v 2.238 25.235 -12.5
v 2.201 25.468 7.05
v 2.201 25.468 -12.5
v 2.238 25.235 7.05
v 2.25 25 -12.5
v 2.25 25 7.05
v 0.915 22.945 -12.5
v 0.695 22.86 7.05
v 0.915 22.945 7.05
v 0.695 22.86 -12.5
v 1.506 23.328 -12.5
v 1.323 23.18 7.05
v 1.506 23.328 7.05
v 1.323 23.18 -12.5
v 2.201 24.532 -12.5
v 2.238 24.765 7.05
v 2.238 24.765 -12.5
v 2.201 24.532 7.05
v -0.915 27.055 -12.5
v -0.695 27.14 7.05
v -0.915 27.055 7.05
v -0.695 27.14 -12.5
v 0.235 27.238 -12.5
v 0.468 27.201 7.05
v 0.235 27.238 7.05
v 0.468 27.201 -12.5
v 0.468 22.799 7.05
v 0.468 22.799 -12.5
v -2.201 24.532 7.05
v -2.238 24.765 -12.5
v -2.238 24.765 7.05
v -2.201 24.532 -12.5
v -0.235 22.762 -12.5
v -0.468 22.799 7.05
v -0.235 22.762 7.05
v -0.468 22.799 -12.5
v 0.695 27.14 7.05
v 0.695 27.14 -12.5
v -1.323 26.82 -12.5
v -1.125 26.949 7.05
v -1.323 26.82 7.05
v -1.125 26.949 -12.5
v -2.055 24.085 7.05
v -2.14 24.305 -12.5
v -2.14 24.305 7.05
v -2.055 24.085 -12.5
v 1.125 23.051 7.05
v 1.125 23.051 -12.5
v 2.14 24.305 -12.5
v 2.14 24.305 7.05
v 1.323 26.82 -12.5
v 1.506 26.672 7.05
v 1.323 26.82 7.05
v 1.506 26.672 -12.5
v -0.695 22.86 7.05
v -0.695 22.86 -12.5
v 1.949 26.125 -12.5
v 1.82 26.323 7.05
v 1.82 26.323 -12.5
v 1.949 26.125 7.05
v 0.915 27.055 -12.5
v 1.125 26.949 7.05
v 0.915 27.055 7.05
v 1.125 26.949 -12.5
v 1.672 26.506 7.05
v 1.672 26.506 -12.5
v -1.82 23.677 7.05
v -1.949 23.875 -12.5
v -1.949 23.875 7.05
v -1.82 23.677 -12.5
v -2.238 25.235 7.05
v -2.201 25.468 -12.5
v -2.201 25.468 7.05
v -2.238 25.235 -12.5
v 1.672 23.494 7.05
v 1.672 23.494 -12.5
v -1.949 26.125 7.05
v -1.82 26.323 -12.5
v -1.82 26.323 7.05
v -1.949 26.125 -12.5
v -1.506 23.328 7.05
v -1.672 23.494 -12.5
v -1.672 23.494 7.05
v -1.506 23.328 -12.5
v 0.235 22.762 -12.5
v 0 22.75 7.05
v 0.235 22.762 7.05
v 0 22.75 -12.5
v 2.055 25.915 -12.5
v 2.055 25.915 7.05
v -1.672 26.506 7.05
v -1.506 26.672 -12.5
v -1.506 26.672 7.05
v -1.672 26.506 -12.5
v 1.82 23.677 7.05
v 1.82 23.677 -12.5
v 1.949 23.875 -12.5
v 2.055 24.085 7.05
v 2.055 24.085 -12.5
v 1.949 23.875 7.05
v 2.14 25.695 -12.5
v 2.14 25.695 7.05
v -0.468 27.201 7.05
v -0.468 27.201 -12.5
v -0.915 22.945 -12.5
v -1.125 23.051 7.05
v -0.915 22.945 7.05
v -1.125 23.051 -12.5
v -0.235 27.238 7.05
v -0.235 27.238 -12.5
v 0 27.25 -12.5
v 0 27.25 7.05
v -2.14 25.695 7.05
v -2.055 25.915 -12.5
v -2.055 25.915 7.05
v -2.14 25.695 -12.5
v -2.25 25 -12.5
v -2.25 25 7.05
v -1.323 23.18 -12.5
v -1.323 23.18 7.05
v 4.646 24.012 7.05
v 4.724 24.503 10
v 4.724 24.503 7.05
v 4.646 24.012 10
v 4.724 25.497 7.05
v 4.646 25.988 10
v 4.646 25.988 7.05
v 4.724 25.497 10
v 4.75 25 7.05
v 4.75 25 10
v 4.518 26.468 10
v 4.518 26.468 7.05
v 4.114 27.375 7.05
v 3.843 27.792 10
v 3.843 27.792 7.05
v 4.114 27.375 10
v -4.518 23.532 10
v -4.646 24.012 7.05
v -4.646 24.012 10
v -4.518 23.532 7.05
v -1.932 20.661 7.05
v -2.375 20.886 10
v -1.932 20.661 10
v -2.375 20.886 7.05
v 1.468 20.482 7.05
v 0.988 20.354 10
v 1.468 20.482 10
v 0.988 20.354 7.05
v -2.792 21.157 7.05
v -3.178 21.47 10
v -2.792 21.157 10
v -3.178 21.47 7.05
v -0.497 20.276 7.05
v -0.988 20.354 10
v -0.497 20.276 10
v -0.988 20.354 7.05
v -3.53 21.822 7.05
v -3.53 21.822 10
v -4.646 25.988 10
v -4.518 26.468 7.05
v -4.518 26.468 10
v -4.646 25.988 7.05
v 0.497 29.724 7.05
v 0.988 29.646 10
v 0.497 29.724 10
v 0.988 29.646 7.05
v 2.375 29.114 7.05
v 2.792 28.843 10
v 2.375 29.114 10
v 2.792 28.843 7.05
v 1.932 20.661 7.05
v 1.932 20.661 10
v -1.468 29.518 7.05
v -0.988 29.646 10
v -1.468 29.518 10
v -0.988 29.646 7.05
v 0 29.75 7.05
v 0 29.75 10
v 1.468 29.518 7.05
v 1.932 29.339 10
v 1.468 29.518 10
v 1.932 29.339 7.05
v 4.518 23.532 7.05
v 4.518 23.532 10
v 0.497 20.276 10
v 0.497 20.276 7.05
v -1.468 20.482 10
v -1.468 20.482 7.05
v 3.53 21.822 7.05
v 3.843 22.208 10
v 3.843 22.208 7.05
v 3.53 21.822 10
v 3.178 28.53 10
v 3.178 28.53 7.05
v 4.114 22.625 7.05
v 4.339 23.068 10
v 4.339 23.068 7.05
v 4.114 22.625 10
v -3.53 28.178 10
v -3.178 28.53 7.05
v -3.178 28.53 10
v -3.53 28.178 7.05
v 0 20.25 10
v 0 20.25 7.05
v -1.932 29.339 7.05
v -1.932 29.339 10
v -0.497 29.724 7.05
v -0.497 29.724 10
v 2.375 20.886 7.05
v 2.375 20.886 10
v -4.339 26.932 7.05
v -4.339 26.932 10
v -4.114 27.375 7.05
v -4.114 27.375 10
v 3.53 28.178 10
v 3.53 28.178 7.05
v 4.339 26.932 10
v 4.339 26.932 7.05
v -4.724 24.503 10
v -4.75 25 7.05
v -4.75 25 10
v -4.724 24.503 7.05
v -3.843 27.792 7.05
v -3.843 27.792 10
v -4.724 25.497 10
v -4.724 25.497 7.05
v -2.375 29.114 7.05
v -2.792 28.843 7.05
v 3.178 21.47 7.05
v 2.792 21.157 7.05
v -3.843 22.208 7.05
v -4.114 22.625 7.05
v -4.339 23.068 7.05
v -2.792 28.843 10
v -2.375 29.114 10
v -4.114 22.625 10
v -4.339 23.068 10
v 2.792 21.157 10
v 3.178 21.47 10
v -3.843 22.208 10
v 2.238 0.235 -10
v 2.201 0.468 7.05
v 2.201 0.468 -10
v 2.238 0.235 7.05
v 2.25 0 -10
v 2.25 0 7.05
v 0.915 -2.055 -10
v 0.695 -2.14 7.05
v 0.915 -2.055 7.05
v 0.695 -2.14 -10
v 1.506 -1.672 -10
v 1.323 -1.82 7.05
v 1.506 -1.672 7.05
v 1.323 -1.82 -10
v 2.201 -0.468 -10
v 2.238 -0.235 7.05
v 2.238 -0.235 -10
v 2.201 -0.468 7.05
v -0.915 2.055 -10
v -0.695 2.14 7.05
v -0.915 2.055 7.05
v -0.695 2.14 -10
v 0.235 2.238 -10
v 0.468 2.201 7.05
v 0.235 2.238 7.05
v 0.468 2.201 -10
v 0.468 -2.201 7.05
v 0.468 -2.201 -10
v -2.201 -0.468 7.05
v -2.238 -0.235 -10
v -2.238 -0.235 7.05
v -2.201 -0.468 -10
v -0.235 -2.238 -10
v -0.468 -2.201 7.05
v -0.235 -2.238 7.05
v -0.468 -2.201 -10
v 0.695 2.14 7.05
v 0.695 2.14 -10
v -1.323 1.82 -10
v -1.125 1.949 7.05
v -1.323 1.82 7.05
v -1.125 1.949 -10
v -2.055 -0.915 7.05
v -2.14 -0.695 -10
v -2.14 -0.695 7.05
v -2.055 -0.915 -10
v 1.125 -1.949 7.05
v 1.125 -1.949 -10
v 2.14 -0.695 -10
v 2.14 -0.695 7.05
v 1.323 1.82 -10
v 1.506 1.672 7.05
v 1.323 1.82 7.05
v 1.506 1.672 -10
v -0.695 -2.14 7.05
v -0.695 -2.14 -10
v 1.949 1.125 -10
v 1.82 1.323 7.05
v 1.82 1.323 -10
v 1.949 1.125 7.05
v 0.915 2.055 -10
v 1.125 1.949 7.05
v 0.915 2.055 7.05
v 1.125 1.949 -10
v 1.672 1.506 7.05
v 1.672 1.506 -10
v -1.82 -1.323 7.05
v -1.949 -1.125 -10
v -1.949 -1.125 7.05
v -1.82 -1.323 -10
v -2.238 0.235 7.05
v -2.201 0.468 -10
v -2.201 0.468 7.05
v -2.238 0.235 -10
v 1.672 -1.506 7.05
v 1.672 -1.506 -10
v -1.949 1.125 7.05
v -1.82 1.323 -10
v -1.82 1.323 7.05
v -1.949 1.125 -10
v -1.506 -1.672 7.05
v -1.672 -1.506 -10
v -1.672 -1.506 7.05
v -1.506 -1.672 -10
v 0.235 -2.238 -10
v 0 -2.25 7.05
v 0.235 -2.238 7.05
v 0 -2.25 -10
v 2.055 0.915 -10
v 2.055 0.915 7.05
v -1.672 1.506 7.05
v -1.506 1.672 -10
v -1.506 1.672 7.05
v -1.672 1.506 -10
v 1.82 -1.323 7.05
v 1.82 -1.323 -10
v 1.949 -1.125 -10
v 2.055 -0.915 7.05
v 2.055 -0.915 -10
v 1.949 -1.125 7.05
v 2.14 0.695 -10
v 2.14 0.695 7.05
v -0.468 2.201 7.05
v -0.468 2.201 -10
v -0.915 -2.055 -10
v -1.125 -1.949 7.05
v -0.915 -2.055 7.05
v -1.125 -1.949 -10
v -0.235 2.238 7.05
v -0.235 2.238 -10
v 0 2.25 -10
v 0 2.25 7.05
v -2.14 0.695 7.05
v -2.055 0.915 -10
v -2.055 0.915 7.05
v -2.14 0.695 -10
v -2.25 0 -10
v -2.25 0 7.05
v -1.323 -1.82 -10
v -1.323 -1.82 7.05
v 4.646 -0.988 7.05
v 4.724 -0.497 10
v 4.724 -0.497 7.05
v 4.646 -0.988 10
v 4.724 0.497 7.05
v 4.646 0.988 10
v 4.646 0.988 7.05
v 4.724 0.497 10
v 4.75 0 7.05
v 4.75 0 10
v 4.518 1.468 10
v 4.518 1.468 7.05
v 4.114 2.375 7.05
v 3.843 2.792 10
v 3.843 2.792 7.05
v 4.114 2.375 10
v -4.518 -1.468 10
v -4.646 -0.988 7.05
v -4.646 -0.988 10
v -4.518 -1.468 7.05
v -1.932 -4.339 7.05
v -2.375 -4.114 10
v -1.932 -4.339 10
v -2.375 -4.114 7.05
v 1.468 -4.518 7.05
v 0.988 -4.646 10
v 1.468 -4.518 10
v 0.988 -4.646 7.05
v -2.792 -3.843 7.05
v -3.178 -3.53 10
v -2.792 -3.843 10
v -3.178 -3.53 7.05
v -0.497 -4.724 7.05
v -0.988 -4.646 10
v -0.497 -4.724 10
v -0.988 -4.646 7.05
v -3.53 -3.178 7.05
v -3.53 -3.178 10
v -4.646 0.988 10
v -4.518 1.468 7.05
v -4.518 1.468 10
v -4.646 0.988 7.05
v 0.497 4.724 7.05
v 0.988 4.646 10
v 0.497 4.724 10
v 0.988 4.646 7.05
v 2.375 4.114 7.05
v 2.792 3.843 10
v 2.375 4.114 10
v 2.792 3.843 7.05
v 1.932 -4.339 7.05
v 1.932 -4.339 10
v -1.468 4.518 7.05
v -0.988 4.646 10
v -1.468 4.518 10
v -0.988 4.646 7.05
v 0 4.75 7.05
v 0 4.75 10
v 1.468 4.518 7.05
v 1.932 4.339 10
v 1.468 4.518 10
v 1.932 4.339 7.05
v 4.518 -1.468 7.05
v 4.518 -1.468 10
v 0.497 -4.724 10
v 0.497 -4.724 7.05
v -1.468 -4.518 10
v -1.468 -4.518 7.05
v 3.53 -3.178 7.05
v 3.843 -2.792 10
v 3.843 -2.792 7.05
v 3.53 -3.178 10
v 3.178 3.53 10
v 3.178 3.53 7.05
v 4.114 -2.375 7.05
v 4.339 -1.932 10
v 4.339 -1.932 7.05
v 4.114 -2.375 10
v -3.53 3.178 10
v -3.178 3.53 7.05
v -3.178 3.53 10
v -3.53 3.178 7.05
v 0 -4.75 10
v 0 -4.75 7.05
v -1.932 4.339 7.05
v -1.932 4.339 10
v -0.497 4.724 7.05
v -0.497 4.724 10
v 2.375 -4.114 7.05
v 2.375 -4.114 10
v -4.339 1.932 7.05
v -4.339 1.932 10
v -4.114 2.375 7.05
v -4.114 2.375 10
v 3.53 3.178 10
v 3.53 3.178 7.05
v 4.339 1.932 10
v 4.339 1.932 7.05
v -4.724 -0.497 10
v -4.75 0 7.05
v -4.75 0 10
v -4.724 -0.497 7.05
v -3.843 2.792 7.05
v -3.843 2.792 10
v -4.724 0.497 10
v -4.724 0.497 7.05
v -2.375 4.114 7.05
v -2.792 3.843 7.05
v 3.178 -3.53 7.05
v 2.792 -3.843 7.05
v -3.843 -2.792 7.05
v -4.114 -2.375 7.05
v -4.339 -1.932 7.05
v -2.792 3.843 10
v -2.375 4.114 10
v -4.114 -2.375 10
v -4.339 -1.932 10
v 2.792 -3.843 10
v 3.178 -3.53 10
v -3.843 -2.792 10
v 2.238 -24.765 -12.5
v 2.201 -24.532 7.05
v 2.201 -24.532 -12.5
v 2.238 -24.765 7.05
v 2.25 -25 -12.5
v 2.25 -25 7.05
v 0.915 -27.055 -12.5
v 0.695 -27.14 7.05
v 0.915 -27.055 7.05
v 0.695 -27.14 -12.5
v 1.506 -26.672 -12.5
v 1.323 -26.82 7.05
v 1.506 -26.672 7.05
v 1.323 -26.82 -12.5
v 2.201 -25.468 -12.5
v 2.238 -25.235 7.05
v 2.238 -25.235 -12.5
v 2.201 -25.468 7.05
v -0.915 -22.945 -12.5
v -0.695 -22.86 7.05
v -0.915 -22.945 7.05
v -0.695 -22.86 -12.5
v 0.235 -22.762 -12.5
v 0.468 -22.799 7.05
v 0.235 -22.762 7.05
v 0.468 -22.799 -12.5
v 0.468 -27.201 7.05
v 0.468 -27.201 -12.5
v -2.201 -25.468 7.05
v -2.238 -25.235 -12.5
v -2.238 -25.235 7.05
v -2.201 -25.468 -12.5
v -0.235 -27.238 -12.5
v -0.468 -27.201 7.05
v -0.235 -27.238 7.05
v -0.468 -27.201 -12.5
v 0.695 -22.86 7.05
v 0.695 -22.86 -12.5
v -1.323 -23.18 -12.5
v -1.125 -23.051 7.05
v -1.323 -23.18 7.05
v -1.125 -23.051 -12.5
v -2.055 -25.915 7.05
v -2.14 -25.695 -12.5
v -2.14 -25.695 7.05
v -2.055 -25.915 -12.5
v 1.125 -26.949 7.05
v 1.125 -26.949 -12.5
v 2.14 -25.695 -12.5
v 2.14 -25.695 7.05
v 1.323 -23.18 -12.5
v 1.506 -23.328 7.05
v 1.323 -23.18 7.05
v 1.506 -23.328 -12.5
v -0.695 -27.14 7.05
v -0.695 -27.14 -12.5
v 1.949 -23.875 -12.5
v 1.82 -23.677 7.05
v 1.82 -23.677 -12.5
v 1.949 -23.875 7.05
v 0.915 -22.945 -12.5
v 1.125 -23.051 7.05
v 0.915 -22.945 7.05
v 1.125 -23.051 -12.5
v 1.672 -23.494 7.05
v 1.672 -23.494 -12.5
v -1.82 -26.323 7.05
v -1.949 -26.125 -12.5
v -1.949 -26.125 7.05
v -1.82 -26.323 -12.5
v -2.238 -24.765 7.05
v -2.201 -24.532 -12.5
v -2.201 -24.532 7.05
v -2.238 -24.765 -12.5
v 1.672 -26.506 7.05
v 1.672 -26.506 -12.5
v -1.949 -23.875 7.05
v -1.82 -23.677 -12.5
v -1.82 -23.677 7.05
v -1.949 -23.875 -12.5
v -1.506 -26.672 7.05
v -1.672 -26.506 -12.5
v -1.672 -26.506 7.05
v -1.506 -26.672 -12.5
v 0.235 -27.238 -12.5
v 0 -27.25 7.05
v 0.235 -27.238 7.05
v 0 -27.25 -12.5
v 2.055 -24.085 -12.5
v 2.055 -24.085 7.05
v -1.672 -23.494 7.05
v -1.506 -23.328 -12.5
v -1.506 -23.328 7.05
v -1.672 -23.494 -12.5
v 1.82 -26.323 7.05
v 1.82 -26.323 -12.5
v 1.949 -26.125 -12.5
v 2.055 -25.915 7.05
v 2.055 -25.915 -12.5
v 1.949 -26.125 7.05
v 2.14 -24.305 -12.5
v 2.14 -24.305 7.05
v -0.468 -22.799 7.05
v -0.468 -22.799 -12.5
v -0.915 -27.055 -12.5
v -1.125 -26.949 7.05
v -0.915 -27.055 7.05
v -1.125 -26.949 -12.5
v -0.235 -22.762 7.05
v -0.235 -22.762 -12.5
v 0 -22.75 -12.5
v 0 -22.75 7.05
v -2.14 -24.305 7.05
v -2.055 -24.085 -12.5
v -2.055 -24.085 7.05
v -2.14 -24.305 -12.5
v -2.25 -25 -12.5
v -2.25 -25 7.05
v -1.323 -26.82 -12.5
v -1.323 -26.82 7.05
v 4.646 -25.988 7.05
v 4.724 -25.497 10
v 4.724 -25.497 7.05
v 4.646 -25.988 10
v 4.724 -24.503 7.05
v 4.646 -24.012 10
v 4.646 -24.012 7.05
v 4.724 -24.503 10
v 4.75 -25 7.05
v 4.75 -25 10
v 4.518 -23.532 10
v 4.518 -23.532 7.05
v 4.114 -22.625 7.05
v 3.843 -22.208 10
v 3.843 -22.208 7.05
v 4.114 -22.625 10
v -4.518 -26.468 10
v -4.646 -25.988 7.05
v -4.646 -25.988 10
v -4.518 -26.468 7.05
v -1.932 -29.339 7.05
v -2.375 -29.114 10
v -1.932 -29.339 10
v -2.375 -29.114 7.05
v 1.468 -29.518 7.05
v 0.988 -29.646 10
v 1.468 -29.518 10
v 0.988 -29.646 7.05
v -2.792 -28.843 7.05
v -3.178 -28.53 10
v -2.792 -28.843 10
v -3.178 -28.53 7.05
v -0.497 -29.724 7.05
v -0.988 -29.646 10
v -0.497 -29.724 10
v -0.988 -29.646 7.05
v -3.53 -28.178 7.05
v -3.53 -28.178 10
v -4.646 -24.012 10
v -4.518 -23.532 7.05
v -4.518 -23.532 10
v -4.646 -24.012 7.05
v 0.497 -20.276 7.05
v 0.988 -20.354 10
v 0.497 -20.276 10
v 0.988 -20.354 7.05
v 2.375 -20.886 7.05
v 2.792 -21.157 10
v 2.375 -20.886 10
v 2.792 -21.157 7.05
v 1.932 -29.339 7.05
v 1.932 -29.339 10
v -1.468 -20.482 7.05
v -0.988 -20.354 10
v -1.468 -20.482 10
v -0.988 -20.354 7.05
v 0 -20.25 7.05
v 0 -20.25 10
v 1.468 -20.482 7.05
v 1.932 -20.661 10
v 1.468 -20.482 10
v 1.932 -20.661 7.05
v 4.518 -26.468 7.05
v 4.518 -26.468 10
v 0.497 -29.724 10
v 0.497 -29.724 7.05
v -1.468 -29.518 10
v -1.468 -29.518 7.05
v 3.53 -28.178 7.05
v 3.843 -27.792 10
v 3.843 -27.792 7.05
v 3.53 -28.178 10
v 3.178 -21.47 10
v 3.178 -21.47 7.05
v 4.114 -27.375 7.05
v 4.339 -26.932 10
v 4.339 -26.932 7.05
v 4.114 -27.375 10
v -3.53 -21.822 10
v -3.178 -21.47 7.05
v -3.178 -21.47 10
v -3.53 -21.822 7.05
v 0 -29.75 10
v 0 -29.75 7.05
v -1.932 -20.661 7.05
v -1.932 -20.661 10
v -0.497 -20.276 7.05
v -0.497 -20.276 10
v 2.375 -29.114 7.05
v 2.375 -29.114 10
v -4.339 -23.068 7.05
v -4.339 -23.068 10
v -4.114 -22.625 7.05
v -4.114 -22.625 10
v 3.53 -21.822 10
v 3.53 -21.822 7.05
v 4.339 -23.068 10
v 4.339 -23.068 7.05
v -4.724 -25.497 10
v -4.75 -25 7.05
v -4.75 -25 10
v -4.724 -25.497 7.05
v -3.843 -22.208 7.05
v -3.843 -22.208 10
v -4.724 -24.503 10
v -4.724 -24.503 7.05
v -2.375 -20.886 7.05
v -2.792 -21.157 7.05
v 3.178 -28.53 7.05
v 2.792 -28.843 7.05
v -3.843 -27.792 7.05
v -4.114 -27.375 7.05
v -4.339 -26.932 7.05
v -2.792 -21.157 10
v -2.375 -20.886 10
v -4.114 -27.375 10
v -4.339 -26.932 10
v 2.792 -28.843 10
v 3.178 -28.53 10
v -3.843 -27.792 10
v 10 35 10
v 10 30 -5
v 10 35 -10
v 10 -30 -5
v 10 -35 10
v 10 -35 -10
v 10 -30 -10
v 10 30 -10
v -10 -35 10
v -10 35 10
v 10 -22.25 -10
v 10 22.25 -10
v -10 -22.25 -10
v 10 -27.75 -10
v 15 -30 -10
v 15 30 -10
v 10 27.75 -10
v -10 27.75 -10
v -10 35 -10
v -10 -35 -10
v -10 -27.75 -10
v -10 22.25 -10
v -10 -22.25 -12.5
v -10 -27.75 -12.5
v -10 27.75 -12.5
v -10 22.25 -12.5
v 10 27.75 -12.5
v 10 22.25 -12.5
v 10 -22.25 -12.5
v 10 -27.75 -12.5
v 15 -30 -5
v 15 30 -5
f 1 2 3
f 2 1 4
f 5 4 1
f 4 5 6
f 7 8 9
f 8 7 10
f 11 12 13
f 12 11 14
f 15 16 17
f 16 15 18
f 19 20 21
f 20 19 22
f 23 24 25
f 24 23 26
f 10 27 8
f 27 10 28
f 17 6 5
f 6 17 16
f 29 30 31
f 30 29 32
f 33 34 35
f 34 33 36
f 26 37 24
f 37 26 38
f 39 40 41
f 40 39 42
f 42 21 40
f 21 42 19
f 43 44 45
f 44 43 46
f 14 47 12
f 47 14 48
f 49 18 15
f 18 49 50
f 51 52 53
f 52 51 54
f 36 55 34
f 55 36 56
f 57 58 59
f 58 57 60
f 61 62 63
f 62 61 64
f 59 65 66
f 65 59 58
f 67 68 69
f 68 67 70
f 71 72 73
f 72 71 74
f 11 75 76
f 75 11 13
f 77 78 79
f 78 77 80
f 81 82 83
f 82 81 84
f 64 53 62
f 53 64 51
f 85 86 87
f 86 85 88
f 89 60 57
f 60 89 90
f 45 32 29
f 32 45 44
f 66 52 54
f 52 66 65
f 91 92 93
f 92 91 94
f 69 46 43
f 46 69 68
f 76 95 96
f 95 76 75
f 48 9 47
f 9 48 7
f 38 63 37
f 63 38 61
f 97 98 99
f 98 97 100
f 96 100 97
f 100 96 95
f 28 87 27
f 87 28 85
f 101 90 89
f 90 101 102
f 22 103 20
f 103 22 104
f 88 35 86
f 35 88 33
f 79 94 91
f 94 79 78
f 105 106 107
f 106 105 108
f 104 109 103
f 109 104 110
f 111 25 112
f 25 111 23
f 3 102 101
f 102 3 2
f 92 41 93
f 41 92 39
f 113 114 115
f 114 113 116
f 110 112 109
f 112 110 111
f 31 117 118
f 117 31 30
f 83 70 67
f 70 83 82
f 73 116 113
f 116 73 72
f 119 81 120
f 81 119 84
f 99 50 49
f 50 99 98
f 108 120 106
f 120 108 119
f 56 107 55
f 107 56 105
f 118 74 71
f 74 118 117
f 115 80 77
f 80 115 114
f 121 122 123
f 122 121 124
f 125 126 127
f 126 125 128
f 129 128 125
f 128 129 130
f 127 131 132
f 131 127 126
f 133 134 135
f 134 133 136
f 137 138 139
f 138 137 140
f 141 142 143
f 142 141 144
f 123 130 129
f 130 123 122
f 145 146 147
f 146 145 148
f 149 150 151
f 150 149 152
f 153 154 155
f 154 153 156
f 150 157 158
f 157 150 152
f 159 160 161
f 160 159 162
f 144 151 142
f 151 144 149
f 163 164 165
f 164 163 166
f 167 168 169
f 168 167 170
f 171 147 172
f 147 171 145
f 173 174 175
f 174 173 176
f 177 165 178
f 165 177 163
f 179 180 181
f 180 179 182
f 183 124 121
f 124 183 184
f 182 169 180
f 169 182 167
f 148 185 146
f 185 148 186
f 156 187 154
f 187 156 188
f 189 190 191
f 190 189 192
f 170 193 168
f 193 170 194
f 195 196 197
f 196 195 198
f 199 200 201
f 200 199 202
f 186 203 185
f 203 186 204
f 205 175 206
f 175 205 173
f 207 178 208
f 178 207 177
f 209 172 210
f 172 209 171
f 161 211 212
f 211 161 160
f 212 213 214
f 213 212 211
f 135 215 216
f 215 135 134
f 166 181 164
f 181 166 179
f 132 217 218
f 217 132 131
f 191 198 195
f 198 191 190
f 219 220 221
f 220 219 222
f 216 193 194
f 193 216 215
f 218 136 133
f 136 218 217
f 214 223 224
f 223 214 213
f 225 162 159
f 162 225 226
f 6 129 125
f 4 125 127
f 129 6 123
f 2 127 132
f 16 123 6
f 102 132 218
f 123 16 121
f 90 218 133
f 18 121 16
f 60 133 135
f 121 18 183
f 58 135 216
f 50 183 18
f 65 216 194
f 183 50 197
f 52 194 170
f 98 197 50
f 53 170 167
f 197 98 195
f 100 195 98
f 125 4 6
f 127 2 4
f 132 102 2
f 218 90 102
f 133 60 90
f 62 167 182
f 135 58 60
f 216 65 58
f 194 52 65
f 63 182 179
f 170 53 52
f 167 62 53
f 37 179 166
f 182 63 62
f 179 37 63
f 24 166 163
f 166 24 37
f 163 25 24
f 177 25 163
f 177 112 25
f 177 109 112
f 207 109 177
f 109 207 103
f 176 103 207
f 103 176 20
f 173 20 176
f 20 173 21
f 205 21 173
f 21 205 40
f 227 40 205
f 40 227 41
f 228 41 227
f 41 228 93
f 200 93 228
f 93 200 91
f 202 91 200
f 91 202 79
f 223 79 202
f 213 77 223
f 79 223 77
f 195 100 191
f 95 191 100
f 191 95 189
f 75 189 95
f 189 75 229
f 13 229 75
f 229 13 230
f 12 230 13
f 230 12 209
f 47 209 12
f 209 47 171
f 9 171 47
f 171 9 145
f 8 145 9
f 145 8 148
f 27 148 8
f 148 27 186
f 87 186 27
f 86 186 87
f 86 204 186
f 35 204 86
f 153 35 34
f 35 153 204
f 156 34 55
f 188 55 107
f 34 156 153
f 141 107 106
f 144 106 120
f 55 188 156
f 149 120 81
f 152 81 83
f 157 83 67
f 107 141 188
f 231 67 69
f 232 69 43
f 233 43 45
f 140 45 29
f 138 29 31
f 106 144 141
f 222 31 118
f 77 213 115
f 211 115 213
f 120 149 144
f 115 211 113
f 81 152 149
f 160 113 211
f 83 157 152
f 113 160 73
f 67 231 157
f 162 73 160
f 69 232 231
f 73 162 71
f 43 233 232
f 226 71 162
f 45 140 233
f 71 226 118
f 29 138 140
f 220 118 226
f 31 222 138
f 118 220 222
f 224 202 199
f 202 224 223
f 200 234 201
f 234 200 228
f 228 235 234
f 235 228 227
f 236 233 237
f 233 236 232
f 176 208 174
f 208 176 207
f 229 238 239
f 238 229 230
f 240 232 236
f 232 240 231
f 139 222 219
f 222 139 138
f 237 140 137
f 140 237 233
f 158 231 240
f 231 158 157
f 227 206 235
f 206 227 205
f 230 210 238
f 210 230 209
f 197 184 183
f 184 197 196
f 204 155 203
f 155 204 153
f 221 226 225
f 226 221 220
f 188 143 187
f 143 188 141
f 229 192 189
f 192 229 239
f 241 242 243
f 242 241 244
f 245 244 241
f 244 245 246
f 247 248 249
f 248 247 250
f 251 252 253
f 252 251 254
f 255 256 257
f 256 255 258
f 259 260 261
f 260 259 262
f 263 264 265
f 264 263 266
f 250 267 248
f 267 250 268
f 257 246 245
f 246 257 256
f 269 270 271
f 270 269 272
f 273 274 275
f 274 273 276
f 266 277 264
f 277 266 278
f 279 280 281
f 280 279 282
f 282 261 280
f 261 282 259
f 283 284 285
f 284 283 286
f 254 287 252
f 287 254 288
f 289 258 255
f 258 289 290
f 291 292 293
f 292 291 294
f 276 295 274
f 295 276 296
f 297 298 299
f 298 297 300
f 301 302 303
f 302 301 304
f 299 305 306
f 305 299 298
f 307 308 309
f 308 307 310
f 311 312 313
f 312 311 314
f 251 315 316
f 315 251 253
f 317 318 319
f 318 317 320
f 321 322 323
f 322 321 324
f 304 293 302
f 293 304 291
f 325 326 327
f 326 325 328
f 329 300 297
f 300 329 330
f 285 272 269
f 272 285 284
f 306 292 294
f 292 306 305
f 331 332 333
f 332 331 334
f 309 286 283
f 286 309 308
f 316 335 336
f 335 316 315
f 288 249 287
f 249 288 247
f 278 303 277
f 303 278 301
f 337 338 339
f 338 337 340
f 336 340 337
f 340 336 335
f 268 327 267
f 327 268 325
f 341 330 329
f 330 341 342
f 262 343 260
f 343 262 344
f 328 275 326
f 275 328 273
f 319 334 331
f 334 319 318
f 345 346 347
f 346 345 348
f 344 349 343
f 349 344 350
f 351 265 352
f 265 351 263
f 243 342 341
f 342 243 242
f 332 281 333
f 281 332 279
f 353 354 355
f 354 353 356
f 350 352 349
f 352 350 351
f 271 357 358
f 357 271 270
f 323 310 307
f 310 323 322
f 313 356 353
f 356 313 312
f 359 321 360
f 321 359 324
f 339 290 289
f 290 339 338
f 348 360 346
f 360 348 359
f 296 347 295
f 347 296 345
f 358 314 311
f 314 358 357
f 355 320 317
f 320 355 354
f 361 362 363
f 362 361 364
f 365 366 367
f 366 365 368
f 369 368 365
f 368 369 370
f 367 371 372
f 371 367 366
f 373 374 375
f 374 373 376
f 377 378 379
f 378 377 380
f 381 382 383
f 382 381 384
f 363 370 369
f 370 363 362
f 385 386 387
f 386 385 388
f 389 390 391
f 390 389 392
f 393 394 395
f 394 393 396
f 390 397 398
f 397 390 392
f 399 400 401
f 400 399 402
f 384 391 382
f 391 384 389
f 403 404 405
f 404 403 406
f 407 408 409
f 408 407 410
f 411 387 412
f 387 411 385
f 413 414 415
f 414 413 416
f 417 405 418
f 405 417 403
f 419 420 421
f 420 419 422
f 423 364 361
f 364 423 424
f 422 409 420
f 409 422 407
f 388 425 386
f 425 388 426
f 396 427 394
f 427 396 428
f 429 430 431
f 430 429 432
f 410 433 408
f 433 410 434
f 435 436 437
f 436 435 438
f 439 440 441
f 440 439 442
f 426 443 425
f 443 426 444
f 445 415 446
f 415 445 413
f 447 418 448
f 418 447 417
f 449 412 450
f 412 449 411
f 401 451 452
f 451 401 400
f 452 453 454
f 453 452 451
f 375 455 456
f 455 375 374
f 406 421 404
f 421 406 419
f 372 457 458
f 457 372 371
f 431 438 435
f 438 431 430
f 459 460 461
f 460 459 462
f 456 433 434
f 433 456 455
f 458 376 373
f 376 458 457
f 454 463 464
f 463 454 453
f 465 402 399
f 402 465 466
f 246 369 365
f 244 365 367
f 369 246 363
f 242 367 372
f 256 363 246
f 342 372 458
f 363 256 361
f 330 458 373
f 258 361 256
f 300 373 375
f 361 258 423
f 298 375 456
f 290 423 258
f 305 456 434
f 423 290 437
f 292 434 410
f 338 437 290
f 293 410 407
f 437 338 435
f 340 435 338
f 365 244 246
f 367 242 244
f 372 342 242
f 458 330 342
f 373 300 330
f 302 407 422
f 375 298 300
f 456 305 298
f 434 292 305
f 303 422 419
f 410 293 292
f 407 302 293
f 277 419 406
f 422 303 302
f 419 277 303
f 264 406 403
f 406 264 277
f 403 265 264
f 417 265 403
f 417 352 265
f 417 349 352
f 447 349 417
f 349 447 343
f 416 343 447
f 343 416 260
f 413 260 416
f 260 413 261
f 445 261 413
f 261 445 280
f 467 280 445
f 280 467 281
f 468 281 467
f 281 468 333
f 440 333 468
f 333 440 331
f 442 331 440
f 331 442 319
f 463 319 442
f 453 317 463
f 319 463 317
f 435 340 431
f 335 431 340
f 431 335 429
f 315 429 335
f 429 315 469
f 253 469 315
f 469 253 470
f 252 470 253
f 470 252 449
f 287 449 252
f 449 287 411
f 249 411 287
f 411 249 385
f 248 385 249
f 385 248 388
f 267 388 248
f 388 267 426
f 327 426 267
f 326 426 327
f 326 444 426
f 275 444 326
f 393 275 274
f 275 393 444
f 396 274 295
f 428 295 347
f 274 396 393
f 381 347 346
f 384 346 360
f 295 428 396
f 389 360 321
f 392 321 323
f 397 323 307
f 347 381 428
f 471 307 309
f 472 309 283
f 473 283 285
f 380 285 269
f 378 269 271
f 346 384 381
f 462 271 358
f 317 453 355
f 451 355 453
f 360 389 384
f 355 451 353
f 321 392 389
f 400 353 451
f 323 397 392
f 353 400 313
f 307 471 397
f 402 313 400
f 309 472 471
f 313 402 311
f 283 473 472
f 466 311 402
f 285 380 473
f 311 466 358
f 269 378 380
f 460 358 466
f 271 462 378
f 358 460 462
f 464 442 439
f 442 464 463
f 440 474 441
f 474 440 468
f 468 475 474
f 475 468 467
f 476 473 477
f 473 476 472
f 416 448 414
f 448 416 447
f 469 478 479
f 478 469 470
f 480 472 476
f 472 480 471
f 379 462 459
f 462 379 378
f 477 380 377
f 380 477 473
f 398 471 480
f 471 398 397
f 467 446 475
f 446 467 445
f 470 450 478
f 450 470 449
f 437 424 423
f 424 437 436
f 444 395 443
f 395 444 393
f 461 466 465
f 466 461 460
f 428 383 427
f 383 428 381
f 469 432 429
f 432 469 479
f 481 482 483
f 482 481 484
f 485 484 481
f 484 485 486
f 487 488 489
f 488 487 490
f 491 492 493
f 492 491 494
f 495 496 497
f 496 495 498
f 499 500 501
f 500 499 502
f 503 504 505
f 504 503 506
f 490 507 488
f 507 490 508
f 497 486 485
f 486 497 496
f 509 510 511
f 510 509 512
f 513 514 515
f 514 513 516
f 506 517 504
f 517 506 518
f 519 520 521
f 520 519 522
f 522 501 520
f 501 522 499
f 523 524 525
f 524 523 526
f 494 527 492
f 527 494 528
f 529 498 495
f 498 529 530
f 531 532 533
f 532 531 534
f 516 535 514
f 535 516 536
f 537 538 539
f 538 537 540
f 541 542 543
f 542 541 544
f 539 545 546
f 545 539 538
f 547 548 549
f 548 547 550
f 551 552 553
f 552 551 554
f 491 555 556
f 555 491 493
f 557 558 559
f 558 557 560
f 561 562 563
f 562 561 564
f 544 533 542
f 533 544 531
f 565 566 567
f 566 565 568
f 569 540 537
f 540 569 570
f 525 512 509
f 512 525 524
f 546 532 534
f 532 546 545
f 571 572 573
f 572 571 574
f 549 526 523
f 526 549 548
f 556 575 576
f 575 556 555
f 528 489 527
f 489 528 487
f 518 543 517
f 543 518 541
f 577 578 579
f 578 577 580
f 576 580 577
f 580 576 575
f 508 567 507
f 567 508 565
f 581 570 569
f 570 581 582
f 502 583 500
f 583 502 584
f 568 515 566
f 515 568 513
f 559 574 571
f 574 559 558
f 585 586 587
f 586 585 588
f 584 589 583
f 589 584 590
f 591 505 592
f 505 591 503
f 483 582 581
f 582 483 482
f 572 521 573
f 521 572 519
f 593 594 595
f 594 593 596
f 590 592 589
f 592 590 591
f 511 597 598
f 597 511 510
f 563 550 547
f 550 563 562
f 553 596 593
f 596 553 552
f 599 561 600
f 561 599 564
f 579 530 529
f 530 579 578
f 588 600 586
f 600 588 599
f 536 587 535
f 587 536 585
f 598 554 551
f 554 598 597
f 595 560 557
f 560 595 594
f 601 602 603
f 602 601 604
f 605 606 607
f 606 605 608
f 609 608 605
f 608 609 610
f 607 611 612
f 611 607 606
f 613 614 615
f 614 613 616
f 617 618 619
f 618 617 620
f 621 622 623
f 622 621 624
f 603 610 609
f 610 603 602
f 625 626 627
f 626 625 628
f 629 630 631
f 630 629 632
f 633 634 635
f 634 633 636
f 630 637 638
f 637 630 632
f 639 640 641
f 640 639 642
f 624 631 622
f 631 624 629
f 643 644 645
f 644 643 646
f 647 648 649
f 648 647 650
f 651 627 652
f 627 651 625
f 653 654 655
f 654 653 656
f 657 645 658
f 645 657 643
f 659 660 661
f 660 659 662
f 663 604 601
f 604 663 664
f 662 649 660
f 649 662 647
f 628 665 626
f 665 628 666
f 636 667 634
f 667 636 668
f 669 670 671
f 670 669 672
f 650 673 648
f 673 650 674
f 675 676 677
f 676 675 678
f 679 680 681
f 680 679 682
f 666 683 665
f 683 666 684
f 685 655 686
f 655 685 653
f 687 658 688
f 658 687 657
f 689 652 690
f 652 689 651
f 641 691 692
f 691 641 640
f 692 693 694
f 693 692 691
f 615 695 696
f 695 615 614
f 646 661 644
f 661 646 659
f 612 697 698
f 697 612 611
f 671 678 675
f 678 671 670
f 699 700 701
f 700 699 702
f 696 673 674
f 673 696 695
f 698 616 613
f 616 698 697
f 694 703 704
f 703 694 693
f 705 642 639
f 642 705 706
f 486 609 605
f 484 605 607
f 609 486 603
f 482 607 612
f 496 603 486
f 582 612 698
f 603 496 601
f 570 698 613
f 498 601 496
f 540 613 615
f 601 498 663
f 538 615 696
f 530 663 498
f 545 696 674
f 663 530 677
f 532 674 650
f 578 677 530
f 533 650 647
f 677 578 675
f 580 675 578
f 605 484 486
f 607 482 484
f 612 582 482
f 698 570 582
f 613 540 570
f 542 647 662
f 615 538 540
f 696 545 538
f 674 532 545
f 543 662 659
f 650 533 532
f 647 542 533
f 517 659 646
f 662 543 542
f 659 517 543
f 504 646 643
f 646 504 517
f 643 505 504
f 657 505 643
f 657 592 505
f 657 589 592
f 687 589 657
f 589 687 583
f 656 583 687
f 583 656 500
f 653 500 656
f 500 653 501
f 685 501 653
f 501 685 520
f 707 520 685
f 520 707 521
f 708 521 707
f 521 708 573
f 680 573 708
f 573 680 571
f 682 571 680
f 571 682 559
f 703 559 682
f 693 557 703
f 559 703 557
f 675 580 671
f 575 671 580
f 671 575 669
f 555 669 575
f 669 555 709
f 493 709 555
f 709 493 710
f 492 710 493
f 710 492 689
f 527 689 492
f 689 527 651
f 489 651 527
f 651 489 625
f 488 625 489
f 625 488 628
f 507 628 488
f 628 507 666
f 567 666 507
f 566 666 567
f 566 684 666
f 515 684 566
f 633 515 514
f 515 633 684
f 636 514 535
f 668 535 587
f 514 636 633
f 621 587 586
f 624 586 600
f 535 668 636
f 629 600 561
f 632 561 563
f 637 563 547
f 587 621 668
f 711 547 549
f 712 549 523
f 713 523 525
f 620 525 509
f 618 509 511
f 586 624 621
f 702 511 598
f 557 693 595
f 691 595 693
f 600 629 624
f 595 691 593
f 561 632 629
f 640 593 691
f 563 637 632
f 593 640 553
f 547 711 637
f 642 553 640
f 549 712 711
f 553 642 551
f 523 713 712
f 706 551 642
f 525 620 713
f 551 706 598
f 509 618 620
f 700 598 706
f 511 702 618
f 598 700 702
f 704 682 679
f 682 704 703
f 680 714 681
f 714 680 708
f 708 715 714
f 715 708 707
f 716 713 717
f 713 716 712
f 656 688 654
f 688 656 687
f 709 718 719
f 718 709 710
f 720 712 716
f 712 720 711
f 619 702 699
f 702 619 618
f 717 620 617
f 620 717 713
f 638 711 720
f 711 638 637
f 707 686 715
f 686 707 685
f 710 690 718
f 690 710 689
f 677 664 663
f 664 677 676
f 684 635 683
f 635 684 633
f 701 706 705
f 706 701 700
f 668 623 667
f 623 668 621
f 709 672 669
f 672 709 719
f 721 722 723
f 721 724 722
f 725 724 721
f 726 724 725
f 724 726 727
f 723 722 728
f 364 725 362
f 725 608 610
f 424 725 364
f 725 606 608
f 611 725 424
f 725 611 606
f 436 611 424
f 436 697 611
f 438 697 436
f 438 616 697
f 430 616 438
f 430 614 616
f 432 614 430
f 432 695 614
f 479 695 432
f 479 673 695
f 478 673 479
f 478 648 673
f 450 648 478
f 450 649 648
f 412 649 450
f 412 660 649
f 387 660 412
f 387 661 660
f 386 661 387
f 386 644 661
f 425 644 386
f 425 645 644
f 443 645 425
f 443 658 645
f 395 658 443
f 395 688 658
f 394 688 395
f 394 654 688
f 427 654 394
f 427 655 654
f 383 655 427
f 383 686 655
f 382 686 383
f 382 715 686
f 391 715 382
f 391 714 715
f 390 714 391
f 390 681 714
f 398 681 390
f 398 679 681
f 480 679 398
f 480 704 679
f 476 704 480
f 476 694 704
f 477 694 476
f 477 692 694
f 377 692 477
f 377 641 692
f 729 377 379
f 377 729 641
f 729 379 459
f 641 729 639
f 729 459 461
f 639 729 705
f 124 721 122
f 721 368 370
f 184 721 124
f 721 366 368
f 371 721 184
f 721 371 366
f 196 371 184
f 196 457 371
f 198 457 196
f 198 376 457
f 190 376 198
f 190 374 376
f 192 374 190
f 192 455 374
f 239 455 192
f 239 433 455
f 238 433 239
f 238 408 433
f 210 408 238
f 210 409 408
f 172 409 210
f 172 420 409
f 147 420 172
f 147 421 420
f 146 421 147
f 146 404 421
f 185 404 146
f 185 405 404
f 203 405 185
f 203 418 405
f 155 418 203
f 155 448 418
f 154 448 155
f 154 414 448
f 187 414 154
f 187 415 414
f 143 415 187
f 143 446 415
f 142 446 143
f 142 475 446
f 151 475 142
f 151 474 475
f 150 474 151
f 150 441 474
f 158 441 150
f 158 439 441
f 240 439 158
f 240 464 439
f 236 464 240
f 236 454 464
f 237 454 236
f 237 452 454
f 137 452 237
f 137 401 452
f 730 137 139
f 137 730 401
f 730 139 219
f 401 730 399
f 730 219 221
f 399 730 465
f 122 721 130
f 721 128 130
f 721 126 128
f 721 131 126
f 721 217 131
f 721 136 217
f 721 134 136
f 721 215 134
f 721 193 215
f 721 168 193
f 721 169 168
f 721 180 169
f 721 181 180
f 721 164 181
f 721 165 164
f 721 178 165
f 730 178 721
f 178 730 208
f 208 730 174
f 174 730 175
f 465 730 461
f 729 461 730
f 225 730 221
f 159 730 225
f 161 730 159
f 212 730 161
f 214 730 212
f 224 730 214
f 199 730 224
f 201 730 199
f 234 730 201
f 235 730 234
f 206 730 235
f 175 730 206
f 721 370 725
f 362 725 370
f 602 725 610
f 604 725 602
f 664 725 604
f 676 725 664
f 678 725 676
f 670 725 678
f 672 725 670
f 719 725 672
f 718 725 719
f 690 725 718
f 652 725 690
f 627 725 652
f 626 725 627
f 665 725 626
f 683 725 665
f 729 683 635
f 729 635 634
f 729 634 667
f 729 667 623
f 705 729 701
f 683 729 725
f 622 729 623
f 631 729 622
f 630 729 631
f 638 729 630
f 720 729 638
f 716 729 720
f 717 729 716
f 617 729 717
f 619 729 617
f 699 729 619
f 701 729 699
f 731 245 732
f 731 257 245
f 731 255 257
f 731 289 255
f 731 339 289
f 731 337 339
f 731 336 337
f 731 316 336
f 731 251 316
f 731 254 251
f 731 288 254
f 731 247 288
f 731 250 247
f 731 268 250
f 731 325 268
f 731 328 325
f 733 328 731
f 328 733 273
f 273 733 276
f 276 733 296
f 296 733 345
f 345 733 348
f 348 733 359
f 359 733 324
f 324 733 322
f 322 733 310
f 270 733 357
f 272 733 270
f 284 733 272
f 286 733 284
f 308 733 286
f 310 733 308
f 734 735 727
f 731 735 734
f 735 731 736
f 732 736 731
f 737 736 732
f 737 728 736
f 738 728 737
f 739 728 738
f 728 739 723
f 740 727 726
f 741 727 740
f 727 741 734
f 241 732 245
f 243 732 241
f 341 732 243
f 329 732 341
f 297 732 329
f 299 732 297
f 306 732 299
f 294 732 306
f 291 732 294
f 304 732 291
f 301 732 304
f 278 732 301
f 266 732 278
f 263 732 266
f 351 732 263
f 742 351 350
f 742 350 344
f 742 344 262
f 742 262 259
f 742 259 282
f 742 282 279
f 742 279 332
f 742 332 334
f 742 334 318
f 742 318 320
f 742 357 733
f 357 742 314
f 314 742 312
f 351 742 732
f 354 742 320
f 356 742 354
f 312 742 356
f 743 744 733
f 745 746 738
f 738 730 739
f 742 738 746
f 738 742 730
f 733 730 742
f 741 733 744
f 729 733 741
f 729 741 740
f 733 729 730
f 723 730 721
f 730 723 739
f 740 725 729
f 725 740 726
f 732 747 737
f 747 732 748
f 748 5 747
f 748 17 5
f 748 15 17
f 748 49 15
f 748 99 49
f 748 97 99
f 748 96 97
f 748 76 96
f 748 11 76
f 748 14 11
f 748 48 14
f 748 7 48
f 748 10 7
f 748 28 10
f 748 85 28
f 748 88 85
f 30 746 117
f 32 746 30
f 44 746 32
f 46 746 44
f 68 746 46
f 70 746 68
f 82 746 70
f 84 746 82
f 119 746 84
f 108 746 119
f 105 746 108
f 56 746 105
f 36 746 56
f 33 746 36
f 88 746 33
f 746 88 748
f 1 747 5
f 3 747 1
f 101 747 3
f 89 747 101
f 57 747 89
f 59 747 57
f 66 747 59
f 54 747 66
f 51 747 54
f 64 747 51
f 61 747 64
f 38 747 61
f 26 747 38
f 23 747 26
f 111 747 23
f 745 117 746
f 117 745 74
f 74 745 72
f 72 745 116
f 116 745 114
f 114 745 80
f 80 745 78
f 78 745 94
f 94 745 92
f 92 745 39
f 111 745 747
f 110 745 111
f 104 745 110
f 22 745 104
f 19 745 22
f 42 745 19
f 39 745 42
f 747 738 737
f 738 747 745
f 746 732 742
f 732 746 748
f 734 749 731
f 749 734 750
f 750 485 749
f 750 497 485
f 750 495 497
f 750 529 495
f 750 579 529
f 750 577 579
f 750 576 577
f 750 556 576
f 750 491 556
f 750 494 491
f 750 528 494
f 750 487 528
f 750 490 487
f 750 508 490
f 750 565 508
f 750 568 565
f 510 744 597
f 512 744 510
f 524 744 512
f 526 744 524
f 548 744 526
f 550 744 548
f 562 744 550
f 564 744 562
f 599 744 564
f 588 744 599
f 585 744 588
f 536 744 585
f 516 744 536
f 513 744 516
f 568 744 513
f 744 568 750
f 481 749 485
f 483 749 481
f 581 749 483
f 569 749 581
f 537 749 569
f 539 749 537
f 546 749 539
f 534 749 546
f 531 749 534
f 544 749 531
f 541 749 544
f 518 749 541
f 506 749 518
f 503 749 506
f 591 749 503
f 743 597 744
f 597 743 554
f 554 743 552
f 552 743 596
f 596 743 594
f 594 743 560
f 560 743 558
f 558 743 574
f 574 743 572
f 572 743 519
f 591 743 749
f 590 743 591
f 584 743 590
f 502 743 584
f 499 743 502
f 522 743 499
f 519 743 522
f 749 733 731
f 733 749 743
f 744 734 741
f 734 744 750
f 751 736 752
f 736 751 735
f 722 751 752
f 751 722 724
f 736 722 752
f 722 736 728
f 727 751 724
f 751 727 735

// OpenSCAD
// Spannpratzen

B = 20;
T = 70;
H = 20;

b = 5;
t = 60;
h = 5;

pratze = true;
nabe = true;
pratze_beweglich = false;
pratze_gewinde = false;
knopf = false;
halter = false;
huelse = false;
stuetze = false;


if (pratze) pratze();
if (pratze_beweglich) pratze_beweglich();
if (pratze_gewinde) pratze_gewinde();
if (knopf) knopf();
if (stuetze) stuetze();
if (huelse) huelse();
if (halter) 
    translate([0,0,-H/2-h/2]) halter();

module pratze() {
    difference() {
        cube([B,T,H],center=true);
        translate([0,25,0])
        loch();
        translate([0,0,0])
        loch();
        translate([0,-25,0])
        loch();
    }
    translate([B/2+b/2,0,-H/2+h/2])
    if (nabe) nabe();
    
    translate([0,25,-H/2-1.25])
    nase();
    translate([0,-25,-H/2-1.25])
    nase();
}

module loch() {
    $fn = 60;
    cylinder(d=4.5,h=H+2,center=true);
    translate([0,0,H/2-1.4])
    cylinder(d=9.5,h=3.1,center=true);
    
}

module nase() {
    $fn = 60;
    difference() {
        cube([B,5.5,2.5],center=true);
        cylinder(d=4.5,h=4.5,center=true);
    }
}

module nase2() {
    $fn = 60;
    difference() {
        cube([B,5.5,2.5],center=true);
//        cylinder(d=4.5,h=4.5,center=true);
    }
}

module nabe() {
    cube([b,t,h],center=true);
}

module stuetze() {
    cube([B,T,h],center=true);
    translate([0,25,-h/2-1.25])
    nase2();
    translate([0,-25,-h/2-1.25])
    nase2();
}

module halter() {
    $fn = 60;
    difference() {
        cube([B-6,10,4],center = true);
        cylinder(d=4.5,h=4.5,center=true);
        
        translate([0,0,0.5])
        cylinder(d=8.3,h=3.8,center=true,$fn = 6);
   }
}

module pratze_beweglich() {
    difference() {
        pratze();
        translate([-B+5,0,0])
        schlitz_loch();
    }
}

module schlitz_loch() {
    
        rotate([0,90,0])
        cylinder(d=6.8,h=B,center=true);
    
        translate([B/2,0,-5])
        rotate([0,90,0])
        cube([20,15,3],center=true);
}


module pratze_gewinde() {
    difference() {
        cube([B,T,H],center=true);
        translate([0,25,0])
        loch();
        translate([0,-25,0])
        loch();

        translate([0,0,0])
        gewinde();
    }
   
    translate([0,25,-H/2-1.25])
    nase();
    translate([0,-25,-H/2-1.25])
    nase();


}

module gewinde() {
        $fn = 60;
        rotate([0,90,0])
        cylinder(d=4.92,h=B+5,center=true);
}

module knopf() {

    halbknopf();
    rotate([180,180,0])
    halbknopf();
}


module halbknopf() {
    $fn = 60;
    difference() {
    
        union() {
            cylinder(d=15,h=15, center=true, $fn=8);
            translate([0,0,5.5])
            cylinder(d=15,h=4, center=true);
        }    
        translate([20/2,0,0])
        cube([20,20,20],center=true);
        
        translate([0,0,0])
        cylinder(d=12,h=9, center=false);
        
    }
}


module huelse() {
    $fn = 60;
    difference() {
        cylinder(d=12,h=5, center=true);
        cylinder(d=4.92,h=5, center=true);
    }    

}
